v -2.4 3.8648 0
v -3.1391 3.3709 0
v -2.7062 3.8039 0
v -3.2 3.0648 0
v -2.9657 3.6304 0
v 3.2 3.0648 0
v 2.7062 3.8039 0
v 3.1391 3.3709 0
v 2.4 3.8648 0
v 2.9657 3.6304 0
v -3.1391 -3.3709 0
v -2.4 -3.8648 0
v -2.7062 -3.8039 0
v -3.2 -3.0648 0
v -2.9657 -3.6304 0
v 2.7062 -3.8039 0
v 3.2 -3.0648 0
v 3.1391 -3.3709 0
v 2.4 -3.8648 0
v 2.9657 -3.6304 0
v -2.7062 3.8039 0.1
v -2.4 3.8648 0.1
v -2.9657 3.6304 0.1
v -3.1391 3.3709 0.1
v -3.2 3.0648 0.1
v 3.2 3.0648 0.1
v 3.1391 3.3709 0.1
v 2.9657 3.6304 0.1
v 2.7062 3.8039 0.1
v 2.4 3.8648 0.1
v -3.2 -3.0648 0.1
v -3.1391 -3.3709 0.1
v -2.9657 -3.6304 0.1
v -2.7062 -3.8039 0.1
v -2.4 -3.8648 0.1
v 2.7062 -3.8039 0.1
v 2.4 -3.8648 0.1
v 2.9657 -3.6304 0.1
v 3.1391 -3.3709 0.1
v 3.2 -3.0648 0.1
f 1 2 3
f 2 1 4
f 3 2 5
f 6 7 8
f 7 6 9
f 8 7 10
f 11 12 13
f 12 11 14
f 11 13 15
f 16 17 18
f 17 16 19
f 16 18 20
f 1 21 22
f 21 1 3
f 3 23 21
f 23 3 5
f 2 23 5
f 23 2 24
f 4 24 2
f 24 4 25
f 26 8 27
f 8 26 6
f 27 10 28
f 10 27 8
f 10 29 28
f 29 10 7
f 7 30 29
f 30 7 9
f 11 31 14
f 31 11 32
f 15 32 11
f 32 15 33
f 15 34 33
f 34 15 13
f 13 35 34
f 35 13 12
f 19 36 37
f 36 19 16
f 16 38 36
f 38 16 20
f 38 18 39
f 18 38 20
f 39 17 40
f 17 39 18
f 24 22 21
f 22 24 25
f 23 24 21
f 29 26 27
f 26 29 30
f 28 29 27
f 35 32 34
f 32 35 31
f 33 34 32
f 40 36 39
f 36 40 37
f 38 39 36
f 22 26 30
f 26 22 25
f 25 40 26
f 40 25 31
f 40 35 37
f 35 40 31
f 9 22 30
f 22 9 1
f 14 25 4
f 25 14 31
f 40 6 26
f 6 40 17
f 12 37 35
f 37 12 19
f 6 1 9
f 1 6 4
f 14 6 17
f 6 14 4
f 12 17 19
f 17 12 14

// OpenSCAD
// file: ../p/1-4cyli.scad
use <../lib.scad>
function ldraw_lib__1_4cyli() = [
// 0 Cylinder 0.25
// 0 Name: 1-4cyli.dat
// 0 Author: James Jessiman
// 0 !LDRAW_ORG Primitive UPDATE 2012-01
// 0 !LICENSE Licensed under CC BY 2.0 and CC BY 4.0 : see CAreadme.txt
// 
// 0 BFC CERTIFY CCW
  [0,"BFC","CERTIFY"],
  [0,"BFC","CCW"],
// 
// 0 !HISTORY 2002-03-23 [sbliss] Added BFC statement.
// 0 !HISTORY 2002-04-25 [PTadmin] Official Update 2002-02
// 0 !HISTORY 2007-06-22 [PTadmin] Header formatted for Contributor Agreement
// 0 !HISTORY 2008-07-01 [PTadmin] Official Update 2008-01
// 0 !HISTORY 2012-02-16 [Philo] Changed to CCW
// 0 !HISTORY 2012-03-30 [PTadmin] Official Update 2012-01
// 
// 
// 4 16 1 1 0 0.9239 1 0.3827 0.9239 0 0.3827 1 0 0
  [4,16,1,1,0,0.9239,1,0.3827,0.9239,0,0.3827,1,0,0],
// 5 24 1 0 0 1 1 0 0.9239 0 0.3827 1 0 -1
  [5,24,1,0,0,1,1,0,0.9239,0,0.3827,1,0,-1],
// 4 16 0.9239 1 0.3827 0.7071 1 0.7071 0.7071 0 0.7071 0.9239 0 0.3827
  [4,16,0.9239,1,0.3827,0.7071,1,0.7071,0.7071,0,0.7071,0.9239,0,0.3827],
// 5 24 0.9239 0 0.3827 0.9239 1 0.3827 0.7071 0 0.7071 1 0 0
  [5,24,0.9239,0,0.3827,0.9239,1,0.3827,0.7071,0,0.7071,1,0,0],
// 4 16 0.7071 1 0.7071 0.3827 1 0.9239 0.3827 0 0.9239 0.7071 0 0.7071
  [4,16,0.7071,1,0.7071,0.3827,1,0.9239,0.3827,0,0.9239,0.7071,0,0.7071],
// 5 24 0.7071 0 0.7071 0.7071 1 0.7071 0.3827 0 0.9239 0.9239 0 0.3827
  [5,24,0.7071,0,0.7071,0.7071,1,0.7071,0.3827,0,0.9239,0.9239,0,0.3827],
// 4 16 0.3827 1 0.9239 0 1 1 0 0 1 0.3827 0 0.9239
  [4,16,0.3827,1,0.9239,0,1,1,0,0,1,0.3827,0,0.9239],
// 5 24 0.3827 0 0.9239 0.3827 1 0.9239 0 0 1 0.7071 0 0.7071
  [5,24,0.3827,0,0.9239,0.3827,1,0.9239,0,0,1,0.7071,0,0.7071],
// 5 24 0 0 1 0 1 1 0.3827 0 0.9239 -1 0 1
  [5,24,0,0,1,0,1,1,0.3827,0,0.9239,-1,0,1],
];
module ldraw_lib__1_4cyli(step=0, col=false, unit=2/5, alt=false, line=0.2, solid=!$preview)
    makepoly(ldraw_lib__1_4cyli(), step=step, col=col, unit=unit, alt=alt, line=line, solid=solid);
ldraw_lib__1_4cyli(line=0.2);
// file: ../p/1-4chrd.scad
use <../lib.scad>
function ldraw_lib__1_4chrd() = [
// 0 Chord 0.25
// 0 Name: 1-4chrd.dat
// 0 Author: Tony Hafner [hafhead]
// 0 !LDRAW_ORG Primitive UPDATE 2012-02
// 0 !LICENSE Licensed under CC BY 2.0 and CC BY 4.0 : see CAreadme.txt
// 
// 0 BFC CERTIFY CCW
  [0,"BFC","CERTIFY"],
  [0,"BFC","CCW"],
// 
// 0 !HISTORY 2004-04-22 [PTadmin] Official Update 2004-02
// 0 !HISTORY 2007-10-09 [PTadmin] Header formatted for Contributor Agreement
// 0 !HISTORY 2008-07-01 [PTadmin] Official Update 2008-01
// 0 !HISTORY 2012-08-02 [MMR1988] Re-creation with PrimGen2 and Rectifier
// 0 !HISTORY 2012-08-09 [PTadmin] Official Update 2012-02
// 
// 
// 4 16 0.9239 0 0.3827 0.3827 0 0.9239 0 0 1 1 0 0
  [4,16,0.9239,0,0.3827,0.3827,0,0.9239,0,0,1,1,0,0],
// 3 16 0.7071 0 0.7071 0.3827 0 0.9239 0.9239 0 0.3827
  [3,16,0.7071,0,0.7071,0.3827,0,0.9239,0.9239,0,0.3827],
];
module ldraw_lib__1_4chrd(step=0, col=false, unit=2/5, alt=false, line=0.2, solid=!$preview)
    makepoly(ldraw_lib__1_4chrd(), step=step, col=col, unit=unit, alt=alt, line=line, solid=solid);
ldraw_lib__1_4chrd(line=0.2);
// main file
use <../lib.scad>
use <../p/1-4chrd.scad>
use <../p/1-4cyli.scad>
function ldraw_lib__6009194a() = [
// 0 Sticker  1.0 x  0.8 White with Rounded Corners
// 0 Name: 6009194a.dat
// 0 Author: Massimo Maso [Sirio]
// 0 !LDRAW_ORG Part UPDATE 2019-01
// 0 !LICENSE Licensed under CC BY 2.0 and CC BY 4.0 : see CAreadme.txt
// 
// 0 BFC CERTIFY CCW
  [0,"BFC","CERTIFY"],
  [0,"BFC","CCW"],
// 
// 0 !KEYWORDS Ferrari, FXX, Polybag, Racers, Set 30195
// 
// 0 !HISTORY 2019-06-28 [PTadmin] Official Update 2019-01
// 
// 
// 0 // Primitives
// 
// 1 16 -6 0 7.6619 0 0 -2 0 -1 0 2 0 0 1-4chrd.dat
  [1,16,-6,0,7.6619,0,0,-2,0,-1,0,2,0,0, ldraw_lib__1_4chrd()],
// 1 16 6 0 7.6619 2 0 0 0 -1 0 0 0 2 1-4chrd.dat
  [1,16,6,0,7.6619,2,0,0,0,-1,0,0,0,2, ldraw_lib__1_4chrd()],
// 1 16 -6 0 -7.6619 -2 0 0 0 -1 0 0 0 -2 1-4chrd.dat
  [1,16,-6,0,-7.6619,-2,0,0,0,-1,0,0,0,-2, ldraw_lib__1_4chrd()],
// 1 16 6 0 -7.6619 0 0 2 0 -1 0 -2 0 0 1-4chrd.dat
  [1,16,6,0,-7.6619,0,0,2,0,-1,0,-2,0,0, ldraw_lib__1_4chrd()],
// 1 16 -6 -0.25 7.6619 0 0 -2 0 0.25 0 2 0 0 1-4cyli.dat
  [1,16,-6,-0.25,7.6619,0,0,-2,0,0.25,0,2,0,0, ldraw_lib__1_4cyli()],
// 1 16 6 -0.25 7.6619 2 0 0 0 0.25 0 0 0 2 1-4cyli.dat
  [1,16,6,-0.25,7.6619,2,0,0,0,0.25,0,0,0,2, ldraw_lib__1_4cyli()],
// 1 16 -6 -0.25 -7.6619 -2 0 0 0 0.25 0 0 0 -2 1-4cyli.dat
  [1,16,-6,-0.25,-7.6619,-2,0,0,0,0.25,0,0,0,-2, ldraw_lib__1_4cyli()],
// 1 16 6 -0.25 -7.6619 0 0 2 0 0.25 0 -2 0 0 1-4cyli.dat
  [1,16,6,-0.25,-7.6619,0,0,2,0,0.25,0,-2,0,0, ldraw_lib__1_4cyli()],
// 1 15 -6 -0.25 7.6619 0 0 -2 0 1 0 2 0 0 1-4chrd.dat
  [1,15,-6,-0.25,7.6619,0,0,-2,0,1,0,2,0,0, ldraw_lib__1_4chrd()],
// 1 15 6 -0.25 7.6619 2 0 0 0 1 0 0 0 2 1-4chrd.dat
  [1,15,6,-0.25,7.6619,2,0,0,0,1,0,0,0,2, ldraw_lib__1_4chrd()],
// 1 15 -6 -0.25 -7.6619 -2 0 0 0 1 0 0 0 -2 1-4chrd.dat
  [1,15,-6,-0.25,-7.6619,-2,0,0,0,1,0,0,0,-2, ldraw_lib__1_4chrd()],
// 1 15 6 -0.25 -7.6619 0 0 2 0 1 0 -2 0 0 1-4chrd.dat
  [1,15,6,-0.25,-7.6619,0,0,2,0,1,0,-2,0,0, ldraw_lib__1_4chrd()],
// 0 // White top faces
// 4 15 -6 -0.25 9.6619 -8 -0.25 7.6619 8 -0.25 7.6619 6 -0.25 9.6619
  [4,15,-6,-0.25,9.6619,-8,-0.25,7.6619,8,-0.25,7.6619,6,-0.25,9.6619],
// 4 15 -8 -0.25 7.6619 -8 -0.25 -7.6619 8 -0.25 -7.6619 8 -0.25 7.6619
  [4,15,-8,-0.25,7.6619,-8,-0.25,-7.6619,8,-0.25,-7.6619,8,-0.25,7.6619],
// 4 15 -8 -0.25 -7.6619 -6 -0.25 -9.6619 6 -0.25 -9.6619 8 -0.25 -7.6619
  [4,15,-8,-0.25,-7.6619,-6,-0.25,-9.6619,6,-0.25,-9.6619,8,-0.25,-7.6619],
// 0 // Neutral lateral faces
// 4 16 -6 0 9.6619 -6 -0.25 9.6619 6 -0.25 9.6619 6 0 9.6619
  [4,16,-6,0,9.6619,-6,-0.25,9.6619,6,-0.25,9.6619,6,0,9.6619],
// 4 16 -8 0 7.6619 -8 0 -7.6619 -8 -0.25 -7.6619 -8 -0.25 7.6619
  [4,16,-8,0,7.6619,-8,0,-7.6619,-8,-0.25,-7.6619,-8,-0.25,7.6619],
// 4 16 8 -0.25 7.6619 8 -0.25 -7.6619 8 0 -7.6619 8 0 7.6619
  [4,16,8,-0.25,7.6619,8,-0.25,-7.6619,8,0,-7.6619,8,0,7.6619],
// 4 16 6 0 -9.6619 6 -0.25 -9.6619 -6 -0.25 -9.6619 -6 0 -9.6619
  [4,16,6,0,-9.6619,6,-0.25,-9.6619,-6,-0.25,-9.6619,-6,0,-9.6619],
// 0 // Neutral bottom faces
// 4 16 6 0 9.6619 8 0 7.6619 -8 0 7.6619 -6 0 9.6619
  [4,16,6,0,9.6619,8,0,7.6619,-8,0,7.6619,-6,0,9.6619],
// 4 16 8 0 7.6619 8 0 -7.6619 -8 0 -7.6619 -8 0 7.6619
  [4,16,8,0,7.6619,8,0,-7.6619,-8,0,-7.6619,-8,0,7.6619],
// 4 16 8 0 -7.6619 6 0 -9.6619 -6 0 -9.6619 -8 0 -7.6619
  [4,16,8,0,-7.6619,6,0,-9.6619,-6,0,-9.6619,-8,0,-7.6619],
];
module ldraw_lib__6009194a(step=0, col=false, unit=2/5, alt=false, line=0.2, solid=!$preview)
    makepoly(ldraw_lib__6009194a(), step=step, col=col, unit=unit, alt=alt, line=line, solid=solid);
ldraw_lib__6009194a(line=0.2);
